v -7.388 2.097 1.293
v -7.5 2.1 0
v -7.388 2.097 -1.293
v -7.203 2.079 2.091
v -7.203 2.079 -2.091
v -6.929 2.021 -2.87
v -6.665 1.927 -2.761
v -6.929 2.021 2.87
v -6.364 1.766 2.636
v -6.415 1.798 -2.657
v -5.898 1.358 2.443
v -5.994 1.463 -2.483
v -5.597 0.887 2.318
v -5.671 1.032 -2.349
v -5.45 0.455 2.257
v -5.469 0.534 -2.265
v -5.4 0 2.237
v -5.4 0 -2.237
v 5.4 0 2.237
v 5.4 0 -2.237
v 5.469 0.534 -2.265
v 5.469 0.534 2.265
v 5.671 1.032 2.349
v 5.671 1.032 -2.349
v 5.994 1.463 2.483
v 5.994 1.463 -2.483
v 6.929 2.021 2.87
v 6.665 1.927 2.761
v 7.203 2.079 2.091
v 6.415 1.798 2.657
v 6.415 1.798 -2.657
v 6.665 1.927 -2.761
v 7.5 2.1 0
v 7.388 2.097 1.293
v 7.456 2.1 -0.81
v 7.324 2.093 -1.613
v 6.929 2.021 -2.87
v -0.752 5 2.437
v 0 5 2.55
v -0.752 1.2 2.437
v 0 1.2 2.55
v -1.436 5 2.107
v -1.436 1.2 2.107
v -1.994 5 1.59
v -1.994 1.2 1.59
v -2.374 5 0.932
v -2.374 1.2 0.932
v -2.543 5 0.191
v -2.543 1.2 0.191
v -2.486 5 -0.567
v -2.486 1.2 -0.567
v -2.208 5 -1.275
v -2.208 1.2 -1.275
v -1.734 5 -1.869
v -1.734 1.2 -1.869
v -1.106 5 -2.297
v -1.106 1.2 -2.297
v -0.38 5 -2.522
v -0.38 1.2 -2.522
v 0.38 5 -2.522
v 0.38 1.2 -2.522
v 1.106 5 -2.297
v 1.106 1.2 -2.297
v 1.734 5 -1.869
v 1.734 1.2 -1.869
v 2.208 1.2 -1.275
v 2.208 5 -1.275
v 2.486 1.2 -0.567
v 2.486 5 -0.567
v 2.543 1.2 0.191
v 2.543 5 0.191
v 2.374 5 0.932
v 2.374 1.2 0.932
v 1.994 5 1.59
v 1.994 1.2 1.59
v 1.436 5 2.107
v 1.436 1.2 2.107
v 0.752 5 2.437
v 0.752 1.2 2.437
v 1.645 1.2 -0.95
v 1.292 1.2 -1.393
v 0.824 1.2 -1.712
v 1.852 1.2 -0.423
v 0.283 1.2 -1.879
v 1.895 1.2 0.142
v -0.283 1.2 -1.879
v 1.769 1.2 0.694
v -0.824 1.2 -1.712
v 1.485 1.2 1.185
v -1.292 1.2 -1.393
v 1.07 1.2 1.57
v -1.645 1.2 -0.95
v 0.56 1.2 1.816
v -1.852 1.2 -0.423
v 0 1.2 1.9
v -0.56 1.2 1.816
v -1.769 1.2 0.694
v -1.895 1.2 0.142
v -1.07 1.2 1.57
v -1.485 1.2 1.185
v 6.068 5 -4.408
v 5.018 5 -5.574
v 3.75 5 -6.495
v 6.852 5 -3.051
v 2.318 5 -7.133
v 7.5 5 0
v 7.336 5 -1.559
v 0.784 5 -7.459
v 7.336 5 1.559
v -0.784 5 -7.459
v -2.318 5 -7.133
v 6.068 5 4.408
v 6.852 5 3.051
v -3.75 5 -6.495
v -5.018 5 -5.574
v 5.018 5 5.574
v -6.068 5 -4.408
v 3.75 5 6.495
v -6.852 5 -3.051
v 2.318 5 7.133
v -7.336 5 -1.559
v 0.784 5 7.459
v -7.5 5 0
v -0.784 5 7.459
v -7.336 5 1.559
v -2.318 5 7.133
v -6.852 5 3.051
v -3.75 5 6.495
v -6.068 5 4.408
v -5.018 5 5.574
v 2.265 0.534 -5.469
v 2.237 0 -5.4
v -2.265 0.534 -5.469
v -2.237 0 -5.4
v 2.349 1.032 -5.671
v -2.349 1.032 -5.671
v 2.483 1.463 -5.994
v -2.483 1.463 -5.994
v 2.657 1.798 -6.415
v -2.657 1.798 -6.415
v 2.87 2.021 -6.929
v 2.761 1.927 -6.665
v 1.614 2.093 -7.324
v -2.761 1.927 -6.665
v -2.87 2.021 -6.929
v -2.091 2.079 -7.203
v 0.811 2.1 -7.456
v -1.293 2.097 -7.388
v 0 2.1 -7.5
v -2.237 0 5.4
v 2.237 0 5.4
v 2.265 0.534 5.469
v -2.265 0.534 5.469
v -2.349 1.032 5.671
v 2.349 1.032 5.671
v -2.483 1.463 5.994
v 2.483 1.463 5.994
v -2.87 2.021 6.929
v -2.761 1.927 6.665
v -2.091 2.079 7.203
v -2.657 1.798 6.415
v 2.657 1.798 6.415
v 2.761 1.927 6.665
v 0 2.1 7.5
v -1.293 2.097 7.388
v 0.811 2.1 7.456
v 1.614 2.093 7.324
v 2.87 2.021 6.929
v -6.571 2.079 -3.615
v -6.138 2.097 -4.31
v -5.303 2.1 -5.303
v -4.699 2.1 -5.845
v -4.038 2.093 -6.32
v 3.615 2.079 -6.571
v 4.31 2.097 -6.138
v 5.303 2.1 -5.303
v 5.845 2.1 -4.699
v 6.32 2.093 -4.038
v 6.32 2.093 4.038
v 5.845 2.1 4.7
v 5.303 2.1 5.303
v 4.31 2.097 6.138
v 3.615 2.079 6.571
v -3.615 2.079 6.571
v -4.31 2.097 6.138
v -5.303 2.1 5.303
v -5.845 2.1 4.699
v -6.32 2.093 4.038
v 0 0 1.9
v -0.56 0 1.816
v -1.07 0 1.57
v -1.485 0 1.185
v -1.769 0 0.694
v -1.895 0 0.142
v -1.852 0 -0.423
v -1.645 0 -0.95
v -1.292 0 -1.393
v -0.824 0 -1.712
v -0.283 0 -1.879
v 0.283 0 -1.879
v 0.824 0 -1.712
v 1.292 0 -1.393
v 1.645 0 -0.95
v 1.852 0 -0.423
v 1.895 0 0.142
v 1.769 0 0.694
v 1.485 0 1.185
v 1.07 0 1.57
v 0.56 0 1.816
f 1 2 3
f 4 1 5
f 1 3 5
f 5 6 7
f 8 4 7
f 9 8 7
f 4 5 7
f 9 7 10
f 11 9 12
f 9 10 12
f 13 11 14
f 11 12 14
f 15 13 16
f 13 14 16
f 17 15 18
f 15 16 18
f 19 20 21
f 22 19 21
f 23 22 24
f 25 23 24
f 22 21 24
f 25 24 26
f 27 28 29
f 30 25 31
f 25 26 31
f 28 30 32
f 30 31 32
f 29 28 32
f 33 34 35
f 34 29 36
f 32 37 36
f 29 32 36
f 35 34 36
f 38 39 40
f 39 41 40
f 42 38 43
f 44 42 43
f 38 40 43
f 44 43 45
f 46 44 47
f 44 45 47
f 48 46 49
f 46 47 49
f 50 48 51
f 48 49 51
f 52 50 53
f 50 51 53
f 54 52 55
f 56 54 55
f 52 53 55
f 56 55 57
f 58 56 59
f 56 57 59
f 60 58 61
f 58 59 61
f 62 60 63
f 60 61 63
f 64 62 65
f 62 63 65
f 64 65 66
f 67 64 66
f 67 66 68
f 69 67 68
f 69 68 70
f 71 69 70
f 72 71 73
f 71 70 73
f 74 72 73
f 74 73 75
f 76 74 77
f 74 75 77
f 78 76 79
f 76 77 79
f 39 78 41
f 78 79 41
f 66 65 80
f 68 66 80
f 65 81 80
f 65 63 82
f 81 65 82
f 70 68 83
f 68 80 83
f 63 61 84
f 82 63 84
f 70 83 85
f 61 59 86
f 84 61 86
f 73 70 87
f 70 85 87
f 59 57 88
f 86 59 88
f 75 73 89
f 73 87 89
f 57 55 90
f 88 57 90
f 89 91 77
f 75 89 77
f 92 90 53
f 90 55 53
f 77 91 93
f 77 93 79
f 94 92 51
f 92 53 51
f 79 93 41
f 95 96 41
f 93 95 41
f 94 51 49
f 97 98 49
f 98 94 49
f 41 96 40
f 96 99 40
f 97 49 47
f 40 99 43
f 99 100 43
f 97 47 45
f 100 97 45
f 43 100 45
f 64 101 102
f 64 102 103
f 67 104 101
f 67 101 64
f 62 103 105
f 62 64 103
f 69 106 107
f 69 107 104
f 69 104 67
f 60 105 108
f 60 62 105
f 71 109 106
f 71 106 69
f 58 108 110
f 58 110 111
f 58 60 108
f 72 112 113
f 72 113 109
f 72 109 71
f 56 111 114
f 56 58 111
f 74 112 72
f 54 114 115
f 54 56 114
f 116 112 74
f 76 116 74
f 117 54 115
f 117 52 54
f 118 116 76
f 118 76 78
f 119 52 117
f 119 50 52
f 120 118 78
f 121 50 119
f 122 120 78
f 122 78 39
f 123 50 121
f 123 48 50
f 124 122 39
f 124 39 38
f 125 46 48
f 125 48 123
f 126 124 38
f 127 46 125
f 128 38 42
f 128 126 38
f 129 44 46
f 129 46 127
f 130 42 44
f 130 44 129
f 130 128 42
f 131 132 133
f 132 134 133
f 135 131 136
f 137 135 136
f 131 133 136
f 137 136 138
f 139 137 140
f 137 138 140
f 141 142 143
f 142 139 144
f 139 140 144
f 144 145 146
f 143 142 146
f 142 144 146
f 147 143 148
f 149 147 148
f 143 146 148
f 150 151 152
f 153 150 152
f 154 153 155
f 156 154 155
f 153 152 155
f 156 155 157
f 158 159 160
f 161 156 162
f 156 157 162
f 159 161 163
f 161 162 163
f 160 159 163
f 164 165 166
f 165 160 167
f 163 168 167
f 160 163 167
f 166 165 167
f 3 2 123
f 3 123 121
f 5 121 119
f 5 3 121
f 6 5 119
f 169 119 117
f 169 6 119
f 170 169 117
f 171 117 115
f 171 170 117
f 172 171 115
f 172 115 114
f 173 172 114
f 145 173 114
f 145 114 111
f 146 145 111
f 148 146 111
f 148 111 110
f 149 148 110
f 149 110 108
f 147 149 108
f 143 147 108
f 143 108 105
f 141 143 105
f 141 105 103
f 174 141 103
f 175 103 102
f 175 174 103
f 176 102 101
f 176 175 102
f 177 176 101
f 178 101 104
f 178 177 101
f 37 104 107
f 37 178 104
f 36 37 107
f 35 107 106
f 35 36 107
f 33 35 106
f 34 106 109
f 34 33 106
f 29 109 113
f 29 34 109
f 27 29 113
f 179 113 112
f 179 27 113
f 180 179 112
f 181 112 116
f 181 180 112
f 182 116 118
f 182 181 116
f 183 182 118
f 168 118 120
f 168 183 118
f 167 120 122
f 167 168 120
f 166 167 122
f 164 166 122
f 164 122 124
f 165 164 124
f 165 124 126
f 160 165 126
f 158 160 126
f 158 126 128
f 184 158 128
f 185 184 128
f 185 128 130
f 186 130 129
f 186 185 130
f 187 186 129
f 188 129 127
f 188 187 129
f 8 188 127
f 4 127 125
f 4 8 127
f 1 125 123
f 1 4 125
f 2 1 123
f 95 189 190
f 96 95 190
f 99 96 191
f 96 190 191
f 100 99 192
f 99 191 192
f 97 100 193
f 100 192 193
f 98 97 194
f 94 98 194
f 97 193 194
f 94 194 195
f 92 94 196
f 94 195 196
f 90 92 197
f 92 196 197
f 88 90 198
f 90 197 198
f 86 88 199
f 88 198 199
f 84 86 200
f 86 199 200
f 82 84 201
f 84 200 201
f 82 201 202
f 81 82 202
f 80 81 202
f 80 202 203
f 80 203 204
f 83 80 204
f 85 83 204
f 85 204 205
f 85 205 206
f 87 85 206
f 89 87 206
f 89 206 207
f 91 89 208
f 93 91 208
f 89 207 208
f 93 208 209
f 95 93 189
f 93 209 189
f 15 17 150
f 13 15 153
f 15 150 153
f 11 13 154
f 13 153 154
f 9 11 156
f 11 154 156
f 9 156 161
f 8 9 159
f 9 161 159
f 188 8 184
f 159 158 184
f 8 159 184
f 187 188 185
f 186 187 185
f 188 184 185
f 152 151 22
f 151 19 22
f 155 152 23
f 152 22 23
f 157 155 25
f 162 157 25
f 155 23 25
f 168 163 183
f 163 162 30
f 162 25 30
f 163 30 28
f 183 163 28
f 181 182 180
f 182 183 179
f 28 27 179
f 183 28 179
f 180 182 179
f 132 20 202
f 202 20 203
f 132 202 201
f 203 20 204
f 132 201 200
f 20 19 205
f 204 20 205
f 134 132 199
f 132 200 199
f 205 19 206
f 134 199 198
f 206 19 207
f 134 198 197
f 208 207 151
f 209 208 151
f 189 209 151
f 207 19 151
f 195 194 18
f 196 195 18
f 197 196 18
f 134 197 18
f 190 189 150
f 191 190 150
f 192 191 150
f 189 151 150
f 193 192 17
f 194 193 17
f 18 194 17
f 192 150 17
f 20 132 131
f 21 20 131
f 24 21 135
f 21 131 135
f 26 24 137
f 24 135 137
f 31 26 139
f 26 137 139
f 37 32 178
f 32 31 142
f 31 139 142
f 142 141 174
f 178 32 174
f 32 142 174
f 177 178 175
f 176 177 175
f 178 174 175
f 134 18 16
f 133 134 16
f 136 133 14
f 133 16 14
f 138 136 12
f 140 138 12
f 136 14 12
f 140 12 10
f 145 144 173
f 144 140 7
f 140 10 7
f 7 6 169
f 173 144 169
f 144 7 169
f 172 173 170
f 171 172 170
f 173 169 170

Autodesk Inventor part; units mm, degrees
ref_plane "YZ Plane" through (0, 0, 0) normal (1, 0, 0) x (0, 1, 0)
ref_plane "XZ Plane" through (0, 0, 0) normal (0, 1, 0) x (-1, 0, 0)
ref_plane "XY Plane" through (0, 0, 0) normal (0, 0, 1) x (1, 0, 0)
sketch "Sketch1" plane through (0, 0, 0) normal (0, 1, 0) x (-1, 0, 0)
  circle A0 centre (0, 0) radius 7.5
  dimension "d0" = 15
extrude "Extrusion1" add sketch "Sketch1" along normal blind 5
sketch "Sketch2" plane through (0, 0, 0) normal (0, 0, 1) x (1, 0, 0)
  line L0 (-7.5, 0) -> (7.5, 0) projected
  line L1 (0, 0) -> (7.5, 0)
  circle A0 centre (7.5, 0) radius 2.1
  dimension "d3" = 4.2
extrude "Extrusion2" cut sketch "Sketch2" along normal mid plane 8
pattern_circular "Circular Pattern1" count 8 over 360 about axis through (0, 0, 0) along (0, 1, 0) of "Extrusion2"
sketch "Sketch3" plane through (0, 5, 0) normal (0, 1, 0) x (1, 0, 0)
  circle A0 centre (0, 0) radius 2.55
  dimension "d9" = 5.1
hole "Hole1" at (0, 5, 0) direction (0, -1, 0) diameter 3.8 end through all counterbore diameter 5.1 counterbore depth 3.8
properties part number "Restraining_cylinder"
